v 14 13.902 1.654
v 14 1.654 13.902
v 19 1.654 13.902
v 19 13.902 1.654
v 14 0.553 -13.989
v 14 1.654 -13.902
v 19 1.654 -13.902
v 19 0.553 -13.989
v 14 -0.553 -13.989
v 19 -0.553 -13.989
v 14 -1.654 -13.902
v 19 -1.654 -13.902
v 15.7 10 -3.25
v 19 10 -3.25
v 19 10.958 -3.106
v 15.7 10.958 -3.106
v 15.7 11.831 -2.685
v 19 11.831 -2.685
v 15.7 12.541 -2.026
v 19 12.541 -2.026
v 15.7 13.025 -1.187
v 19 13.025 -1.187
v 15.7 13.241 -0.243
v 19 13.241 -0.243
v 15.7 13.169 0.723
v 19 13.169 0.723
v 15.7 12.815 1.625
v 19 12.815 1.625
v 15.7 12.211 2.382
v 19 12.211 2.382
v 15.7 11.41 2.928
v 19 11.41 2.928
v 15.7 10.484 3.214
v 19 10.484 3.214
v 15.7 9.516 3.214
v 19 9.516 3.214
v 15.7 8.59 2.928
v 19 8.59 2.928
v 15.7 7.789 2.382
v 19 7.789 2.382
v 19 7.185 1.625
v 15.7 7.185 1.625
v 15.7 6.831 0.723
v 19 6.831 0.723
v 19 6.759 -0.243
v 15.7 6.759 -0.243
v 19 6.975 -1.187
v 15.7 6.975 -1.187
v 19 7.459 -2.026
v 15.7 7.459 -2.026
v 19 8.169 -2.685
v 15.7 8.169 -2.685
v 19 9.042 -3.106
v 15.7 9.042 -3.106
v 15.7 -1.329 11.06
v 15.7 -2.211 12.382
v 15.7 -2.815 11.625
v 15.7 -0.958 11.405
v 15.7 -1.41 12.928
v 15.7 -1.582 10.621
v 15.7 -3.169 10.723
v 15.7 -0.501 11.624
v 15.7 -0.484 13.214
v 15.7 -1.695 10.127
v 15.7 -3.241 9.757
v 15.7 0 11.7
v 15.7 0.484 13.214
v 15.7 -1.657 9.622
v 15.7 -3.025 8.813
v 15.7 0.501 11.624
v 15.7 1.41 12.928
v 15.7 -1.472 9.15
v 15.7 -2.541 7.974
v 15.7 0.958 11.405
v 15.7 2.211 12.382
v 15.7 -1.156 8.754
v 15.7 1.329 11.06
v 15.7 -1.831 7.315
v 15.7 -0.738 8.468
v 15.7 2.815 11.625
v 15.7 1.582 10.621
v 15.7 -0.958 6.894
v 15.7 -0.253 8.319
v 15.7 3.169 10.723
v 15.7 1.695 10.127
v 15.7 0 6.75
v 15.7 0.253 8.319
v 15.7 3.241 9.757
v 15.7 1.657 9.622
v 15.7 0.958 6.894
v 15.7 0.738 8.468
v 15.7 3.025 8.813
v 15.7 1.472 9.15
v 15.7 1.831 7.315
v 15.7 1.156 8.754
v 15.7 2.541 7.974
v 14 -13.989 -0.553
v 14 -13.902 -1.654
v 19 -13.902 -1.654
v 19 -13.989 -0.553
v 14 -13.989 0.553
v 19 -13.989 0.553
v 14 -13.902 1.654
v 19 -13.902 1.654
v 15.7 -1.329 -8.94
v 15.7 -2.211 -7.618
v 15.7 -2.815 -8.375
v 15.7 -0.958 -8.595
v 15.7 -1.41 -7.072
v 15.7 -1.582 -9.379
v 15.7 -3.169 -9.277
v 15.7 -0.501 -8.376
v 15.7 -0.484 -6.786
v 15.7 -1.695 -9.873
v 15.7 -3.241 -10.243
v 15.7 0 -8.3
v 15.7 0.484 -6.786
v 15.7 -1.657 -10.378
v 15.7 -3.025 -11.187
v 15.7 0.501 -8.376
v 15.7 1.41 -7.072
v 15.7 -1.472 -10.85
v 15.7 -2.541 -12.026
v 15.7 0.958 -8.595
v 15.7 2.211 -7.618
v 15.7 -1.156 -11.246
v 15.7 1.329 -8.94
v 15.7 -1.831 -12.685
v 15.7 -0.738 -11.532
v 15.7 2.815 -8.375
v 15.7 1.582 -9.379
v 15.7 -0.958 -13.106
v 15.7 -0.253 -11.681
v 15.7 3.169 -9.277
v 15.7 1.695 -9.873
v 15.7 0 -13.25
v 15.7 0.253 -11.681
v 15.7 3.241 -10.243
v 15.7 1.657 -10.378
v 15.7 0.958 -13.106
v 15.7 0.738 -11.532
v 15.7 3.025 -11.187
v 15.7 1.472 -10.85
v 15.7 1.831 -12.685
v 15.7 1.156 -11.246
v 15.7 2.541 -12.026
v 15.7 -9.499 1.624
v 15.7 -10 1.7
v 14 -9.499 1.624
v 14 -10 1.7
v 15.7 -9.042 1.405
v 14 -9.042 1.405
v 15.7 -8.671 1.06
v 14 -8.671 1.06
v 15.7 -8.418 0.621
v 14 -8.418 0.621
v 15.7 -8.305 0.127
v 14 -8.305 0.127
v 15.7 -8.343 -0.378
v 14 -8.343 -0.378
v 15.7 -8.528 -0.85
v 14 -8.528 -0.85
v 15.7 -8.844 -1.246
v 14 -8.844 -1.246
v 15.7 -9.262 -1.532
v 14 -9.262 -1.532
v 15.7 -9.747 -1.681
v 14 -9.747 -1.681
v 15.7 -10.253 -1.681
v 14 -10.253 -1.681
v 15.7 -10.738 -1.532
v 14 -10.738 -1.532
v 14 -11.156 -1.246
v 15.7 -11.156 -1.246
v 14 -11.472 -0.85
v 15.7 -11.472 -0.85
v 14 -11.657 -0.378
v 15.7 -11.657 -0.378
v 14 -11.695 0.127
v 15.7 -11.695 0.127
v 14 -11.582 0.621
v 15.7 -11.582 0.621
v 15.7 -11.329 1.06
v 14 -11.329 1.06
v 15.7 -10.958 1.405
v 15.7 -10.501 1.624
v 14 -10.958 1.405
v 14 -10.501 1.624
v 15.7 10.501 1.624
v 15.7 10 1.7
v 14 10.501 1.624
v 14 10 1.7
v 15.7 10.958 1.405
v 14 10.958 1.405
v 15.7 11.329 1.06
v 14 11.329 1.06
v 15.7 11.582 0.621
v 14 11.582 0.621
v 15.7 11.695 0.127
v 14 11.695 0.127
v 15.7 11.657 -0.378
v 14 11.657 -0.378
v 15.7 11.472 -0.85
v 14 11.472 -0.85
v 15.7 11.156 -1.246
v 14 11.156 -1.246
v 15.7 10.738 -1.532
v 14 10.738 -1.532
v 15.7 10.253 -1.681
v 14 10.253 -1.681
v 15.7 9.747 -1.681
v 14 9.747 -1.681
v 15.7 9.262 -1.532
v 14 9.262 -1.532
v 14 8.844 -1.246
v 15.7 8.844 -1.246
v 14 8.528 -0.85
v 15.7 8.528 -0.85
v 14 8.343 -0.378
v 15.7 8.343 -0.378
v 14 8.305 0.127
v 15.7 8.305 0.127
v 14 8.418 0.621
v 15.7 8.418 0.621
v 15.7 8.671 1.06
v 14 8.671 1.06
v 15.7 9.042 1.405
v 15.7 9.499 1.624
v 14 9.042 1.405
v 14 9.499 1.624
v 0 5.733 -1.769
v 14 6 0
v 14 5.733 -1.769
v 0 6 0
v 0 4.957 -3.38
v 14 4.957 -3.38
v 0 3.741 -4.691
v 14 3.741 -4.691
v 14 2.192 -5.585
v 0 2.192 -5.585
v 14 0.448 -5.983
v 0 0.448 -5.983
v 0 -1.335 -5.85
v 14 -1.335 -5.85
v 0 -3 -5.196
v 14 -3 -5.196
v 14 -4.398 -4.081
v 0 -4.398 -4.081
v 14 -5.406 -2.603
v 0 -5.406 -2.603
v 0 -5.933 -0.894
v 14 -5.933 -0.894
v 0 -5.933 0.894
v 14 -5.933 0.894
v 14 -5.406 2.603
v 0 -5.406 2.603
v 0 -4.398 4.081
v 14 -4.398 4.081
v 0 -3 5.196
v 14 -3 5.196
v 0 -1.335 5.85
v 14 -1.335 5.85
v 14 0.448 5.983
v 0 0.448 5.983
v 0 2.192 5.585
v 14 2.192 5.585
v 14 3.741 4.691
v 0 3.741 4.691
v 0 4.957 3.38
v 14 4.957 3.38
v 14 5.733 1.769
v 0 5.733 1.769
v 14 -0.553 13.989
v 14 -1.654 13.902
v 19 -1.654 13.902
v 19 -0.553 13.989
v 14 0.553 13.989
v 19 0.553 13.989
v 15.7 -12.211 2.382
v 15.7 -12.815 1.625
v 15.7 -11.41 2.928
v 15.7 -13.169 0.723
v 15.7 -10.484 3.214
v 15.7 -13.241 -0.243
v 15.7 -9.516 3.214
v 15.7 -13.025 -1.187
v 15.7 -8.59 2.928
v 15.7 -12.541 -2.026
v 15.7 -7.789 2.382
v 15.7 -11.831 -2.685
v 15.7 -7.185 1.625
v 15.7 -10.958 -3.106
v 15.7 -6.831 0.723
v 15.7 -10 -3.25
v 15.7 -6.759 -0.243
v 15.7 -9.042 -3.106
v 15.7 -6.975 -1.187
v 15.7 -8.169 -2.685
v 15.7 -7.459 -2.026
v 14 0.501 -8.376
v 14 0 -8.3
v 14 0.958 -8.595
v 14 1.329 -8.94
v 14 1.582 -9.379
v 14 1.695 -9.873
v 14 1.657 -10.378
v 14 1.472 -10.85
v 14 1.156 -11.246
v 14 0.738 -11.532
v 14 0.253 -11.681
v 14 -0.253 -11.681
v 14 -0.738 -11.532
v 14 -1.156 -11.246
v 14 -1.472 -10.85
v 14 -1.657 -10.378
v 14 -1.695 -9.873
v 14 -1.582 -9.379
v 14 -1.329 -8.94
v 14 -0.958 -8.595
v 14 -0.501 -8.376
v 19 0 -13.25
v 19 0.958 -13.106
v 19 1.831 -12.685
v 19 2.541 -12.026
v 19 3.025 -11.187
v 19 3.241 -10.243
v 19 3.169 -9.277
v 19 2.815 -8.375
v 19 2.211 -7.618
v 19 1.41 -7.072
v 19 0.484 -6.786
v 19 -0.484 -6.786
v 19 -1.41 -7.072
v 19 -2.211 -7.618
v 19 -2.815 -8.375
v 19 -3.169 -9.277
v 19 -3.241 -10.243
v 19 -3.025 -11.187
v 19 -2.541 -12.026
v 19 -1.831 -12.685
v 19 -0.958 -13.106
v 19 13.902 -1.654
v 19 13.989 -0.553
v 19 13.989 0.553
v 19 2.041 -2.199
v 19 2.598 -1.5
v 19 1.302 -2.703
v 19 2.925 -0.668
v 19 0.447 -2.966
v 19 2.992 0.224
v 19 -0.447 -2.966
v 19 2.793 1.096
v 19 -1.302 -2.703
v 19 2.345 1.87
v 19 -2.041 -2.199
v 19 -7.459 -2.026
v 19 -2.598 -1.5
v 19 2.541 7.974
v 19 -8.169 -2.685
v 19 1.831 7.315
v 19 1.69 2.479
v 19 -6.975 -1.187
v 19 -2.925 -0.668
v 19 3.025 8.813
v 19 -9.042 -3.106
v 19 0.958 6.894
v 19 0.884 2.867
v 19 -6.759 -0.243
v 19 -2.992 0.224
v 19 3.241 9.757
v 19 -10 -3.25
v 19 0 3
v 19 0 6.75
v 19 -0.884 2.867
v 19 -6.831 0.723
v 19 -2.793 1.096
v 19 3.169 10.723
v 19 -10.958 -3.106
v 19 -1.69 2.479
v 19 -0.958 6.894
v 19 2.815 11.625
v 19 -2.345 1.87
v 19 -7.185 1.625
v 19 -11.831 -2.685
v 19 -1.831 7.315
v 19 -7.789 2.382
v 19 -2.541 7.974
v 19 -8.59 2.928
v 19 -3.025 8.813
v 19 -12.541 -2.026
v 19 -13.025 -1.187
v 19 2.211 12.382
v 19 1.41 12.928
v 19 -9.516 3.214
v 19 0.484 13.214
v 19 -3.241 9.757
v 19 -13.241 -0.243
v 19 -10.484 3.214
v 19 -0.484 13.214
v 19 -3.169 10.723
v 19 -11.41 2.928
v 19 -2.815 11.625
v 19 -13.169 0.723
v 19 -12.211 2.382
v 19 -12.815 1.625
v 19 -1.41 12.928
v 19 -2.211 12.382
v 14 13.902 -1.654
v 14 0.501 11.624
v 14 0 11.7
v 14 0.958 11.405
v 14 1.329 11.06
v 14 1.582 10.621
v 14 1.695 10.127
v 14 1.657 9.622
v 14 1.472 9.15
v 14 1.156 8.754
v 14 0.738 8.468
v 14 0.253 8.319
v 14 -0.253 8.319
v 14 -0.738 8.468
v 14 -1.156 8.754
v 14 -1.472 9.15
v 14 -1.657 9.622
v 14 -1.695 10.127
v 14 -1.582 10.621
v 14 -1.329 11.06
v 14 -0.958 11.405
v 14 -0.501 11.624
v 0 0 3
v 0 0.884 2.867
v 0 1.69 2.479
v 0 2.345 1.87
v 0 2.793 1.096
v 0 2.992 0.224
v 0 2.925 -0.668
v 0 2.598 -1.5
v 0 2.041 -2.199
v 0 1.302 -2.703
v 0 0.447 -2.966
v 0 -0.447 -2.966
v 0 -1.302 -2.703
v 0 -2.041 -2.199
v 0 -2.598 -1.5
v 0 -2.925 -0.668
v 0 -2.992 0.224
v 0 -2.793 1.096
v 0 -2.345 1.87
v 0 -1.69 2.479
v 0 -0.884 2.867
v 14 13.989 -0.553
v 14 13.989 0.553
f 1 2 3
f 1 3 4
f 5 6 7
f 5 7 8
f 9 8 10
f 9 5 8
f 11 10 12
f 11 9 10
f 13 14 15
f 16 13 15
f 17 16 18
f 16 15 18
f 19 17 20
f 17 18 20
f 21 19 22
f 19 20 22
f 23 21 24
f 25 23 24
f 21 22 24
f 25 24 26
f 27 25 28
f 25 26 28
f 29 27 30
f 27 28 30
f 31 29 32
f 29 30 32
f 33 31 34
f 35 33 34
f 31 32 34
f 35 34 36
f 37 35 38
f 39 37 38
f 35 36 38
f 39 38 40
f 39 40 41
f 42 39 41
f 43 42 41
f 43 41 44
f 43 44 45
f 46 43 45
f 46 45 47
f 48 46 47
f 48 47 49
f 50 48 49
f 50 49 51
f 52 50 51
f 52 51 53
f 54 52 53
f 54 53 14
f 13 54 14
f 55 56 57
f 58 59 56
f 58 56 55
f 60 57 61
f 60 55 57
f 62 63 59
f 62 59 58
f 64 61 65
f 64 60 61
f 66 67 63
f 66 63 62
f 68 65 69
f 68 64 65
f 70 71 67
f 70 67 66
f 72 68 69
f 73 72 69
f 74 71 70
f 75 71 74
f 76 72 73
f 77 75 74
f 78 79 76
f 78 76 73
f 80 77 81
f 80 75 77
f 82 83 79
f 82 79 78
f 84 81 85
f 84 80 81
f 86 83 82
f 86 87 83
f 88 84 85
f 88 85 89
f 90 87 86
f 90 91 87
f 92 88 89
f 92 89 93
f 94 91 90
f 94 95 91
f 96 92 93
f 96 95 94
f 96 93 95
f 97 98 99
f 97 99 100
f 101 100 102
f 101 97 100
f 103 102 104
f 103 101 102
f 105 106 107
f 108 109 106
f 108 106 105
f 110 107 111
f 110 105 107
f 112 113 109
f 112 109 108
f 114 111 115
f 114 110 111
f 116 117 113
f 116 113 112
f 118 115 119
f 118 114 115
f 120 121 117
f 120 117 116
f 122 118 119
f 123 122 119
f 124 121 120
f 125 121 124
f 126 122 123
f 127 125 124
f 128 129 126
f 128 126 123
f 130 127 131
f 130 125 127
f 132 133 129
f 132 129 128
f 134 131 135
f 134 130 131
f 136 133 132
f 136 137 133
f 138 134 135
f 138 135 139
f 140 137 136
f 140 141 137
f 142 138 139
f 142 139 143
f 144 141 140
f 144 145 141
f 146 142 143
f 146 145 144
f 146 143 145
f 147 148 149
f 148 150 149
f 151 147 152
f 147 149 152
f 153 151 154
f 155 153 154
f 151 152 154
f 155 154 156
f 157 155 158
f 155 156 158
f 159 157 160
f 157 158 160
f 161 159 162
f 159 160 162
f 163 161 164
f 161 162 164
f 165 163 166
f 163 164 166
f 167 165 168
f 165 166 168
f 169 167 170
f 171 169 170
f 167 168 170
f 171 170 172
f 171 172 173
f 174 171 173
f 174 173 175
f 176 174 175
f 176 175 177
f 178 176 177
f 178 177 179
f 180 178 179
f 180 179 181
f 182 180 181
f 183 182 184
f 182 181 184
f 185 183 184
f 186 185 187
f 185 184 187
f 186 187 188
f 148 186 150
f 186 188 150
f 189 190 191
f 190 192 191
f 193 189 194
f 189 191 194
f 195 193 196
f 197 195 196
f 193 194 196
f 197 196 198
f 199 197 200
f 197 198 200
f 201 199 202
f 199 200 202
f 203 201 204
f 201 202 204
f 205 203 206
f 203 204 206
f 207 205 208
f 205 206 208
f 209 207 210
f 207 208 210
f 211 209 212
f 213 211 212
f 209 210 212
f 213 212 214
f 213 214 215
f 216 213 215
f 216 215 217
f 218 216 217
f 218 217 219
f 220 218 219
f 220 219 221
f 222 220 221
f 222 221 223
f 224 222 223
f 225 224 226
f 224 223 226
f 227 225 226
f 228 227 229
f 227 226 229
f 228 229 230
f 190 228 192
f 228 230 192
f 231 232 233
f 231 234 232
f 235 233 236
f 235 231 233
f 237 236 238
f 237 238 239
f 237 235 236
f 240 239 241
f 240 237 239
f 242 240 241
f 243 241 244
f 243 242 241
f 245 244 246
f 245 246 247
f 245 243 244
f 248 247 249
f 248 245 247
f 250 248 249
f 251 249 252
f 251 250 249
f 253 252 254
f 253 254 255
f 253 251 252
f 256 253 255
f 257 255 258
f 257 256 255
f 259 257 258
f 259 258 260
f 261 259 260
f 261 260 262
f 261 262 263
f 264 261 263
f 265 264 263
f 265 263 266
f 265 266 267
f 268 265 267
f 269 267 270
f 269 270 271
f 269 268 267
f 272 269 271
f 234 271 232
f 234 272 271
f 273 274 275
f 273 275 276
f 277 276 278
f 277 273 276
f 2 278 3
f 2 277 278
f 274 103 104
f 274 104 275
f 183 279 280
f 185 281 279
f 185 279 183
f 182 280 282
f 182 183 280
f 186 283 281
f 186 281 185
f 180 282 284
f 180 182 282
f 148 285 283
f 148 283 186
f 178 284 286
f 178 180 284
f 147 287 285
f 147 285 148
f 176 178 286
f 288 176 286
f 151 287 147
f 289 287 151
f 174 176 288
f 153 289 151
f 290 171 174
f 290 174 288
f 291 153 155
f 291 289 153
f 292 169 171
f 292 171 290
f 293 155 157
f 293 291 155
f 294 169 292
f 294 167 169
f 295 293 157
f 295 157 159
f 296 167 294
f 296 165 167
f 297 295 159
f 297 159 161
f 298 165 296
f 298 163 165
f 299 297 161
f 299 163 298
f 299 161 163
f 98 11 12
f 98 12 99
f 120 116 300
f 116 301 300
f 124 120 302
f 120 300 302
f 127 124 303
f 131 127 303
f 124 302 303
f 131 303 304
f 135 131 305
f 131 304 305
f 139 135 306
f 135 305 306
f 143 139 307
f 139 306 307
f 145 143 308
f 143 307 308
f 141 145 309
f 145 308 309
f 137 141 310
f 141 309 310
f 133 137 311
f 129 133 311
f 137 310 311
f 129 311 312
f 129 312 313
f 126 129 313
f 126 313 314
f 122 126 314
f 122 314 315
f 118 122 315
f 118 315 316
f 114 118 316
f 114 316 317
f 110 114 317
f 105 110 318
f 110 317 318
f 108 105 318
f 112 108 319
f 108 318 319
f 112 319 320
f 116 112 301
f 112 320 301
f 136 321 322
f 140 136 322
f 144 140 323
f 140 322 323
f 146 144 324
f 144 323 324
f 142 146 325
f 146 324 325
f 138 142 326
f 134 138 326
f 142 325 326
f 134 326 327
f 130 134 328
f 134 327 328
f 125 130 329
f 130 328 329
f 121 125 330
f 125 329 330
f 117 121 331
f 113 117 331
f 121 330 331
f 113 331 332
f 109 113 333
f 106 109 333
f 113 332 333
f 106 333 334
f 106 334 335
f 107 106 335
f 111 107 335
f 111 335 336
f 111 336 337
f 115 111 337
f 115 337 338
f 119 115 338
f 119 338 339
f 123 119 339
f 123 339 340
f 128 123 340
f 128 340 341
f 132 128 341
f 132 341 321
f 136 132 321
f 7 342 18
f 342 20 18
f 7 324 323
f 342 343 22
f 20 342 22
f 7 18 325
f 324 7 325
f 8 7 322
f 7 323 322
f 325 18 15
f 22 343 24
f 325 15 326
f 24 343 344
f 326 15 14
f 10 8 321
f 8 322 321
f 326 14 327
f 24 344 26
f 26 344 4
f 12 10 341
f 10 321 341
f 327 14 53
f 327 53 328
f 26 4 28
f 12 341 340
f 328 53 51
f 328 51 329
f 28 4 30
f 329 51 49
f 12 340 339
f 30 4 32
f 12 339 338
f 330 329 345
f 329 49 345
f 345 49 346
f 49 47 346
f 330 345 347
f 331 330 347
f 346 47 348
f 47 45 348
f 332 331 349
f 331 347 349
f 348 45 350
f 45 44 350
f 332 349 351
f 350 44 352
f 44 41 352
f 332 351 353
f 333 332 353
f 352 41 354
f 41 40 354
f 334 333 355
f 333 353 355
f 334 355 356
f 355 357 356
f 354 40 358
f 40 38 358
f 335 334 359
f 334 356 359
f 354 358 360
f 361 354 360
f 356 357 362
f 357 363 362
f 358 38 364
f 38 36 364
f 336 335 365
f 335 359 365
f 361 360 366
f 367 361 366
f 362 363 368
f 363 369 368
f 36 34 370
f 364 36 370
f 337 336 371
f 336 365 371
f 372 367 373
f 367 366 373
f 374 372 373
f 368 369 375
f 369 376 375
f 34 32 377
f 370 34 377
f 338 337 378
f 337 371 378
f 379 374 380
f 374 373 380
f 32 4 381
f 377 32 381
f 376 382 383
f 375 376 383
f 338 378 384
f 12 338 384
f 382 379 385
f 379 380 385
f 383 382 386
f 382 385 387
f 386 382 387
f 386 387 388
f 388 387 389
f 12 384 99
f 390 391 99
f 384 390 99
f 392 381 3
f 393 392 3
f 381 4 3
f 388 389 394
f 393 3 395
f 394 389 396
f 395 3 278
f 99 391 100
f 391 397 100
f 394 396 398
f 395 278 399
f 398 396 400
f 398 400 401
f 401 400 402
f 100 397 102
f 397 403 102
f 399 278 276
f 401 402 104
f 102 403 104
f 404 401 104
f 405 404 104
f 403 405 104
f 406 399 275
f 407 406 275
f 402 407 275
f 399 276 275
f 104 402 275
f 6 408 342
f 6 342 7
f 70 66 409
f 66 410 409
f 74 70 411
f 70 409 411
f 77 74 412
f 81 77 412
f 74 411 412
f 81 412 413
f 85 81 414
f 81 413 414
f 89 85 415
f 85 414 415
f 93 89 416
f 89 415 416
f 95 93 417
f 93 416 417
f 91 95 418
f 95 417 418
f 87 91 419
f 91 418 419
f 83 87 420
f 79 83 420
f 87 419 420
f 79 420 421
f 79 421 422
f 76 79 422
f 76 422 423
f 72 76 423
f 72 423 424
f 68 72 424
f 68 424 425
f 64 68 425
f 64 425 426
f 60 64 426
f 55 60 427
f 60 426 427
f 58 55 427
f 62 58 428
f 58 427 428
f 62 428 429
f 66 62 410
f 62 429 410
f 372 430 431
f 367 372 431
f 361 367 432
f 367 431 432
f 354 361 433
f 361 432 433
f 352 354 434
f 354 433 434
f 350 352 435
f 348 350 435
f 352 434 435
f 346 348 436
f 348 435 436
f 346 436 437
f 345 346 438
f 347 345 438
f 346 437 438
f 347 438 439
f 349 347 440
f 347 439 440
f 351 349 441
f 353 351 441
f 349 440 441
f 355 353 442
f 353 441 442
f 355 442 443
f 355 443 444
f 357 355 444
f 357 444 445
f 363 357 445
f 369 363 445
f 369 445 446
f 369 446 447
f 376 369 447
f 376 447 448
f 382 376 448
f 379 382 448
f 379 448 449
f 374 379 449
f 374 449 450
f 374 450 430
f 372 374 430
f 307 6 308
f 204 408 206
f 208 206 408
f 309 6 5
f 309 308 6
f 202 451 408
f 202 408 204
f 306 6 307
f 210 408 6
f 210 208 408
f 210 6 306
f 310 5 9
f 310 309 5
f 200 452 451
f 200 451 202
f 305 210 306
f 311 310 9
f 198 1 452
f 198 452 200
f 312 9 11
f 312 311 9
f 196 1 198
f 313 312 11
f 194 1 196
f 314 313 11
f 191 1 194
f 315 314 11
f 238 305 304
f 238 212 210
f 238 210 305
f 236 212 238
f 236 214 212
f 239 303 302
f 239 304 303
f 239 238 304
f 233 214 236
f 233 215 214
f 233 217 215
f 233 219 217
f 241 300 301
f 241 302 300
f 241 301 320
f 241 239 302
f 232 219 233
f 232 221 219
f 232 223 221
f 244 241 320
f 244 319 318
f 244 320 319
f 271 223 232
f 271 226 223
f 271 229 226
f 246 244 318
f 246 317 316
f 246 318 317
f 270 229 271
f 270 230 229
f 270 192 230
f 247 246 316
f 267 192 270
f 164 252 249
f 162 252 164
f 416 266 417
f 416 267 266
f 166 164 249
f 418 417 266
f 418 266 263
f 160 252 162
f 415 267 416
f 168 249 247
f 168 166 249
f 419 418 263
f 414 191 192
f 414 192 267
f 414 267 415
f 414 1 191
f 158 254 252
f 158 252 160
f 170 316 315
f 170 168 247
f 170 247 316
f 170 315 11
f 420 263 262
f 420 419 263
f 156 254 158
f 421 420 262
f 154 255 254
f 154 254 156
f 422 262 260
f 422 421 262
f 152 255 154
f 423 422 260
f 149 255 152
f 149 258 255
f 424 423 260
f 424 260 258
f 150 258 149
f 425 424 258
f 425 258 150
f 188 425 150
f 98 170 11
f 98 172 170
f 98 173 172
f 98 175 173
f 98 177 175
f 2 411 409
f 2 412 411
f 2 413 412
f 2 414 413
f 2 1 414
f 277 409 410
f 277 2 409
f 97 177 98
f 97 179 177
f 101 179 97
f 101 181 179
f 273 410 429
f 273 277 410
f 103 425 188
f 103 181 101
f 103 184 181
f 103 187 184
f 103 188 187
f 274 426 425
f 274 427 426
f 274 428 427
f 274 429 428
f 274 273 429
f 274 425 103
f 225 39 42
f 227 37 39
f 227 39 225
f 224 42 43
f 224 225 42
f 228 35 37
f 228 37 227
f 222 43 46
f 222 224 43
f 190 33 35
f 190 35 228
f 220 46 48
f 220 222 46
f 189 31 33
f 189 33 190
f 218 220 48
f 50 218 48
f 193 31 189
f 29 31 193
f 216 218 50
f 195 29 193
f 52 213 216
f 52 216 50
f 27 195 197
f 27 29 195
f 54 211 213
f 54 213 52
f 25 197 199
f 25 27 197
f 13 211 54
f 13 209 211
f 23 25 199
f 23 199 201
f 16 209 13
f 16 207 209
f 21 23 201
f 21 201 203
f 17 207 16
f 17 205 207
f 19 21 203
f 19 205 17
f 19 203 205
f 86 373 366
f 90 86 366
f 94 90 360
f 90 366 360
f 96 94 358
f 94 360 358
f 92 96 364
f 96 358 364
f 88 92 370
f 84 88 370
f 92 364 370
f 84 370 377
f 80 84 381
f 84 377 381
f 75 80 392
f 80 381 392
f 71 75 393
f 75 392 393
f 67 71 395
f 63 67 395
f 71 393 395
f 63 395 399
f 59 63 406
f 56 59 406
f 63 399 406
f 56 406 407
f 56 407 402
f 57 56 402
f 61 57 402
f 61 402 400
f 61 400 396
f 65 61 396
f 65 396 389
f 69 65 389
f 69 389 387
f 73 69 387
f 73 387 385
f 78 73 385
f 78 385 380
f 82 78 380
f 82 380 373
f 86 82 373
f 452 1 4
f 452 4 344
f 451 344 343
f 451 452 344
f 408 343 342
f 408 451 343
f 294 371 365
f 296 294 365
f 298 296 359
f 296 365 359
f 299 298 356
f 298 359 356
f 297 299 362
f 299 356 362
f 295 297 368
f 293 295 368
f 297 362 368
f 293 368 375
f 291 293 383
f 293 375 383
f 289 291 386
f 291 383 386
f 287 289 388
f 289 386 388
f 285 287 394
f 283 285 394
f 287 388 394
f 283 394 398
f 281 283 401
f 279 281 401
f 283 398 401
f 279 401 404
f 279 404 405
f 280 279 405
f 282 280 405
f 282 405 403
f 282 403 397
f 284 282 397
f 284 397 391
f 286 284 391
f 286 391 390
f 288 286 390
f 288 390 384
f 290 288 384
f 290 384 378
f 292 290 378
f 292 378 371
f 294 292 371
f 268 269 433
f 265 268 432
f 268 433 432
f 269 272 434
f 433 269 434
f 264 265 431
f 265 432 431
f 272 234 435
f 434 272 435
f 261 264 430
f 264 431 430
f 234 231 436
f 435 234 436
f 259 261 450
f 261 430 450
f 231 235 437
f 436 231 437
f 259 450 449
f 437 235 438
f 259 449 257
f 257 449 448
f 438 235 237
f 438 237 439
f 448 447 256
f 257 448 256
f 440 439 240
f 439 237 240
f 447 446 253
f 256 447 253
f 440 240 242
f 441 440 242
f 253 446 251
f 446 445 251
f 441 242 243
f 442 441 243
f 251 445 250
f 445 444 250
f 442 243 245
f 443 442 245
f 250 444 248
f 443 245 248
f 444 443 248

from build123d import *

# Parameters (mm, degrees)
BOSS_EXTRUDE1_DEPTH                              = 5
SKETCH2_W                                        = 14
SKETCH2_H                                        = 6
F_6_0_6_DIAMETER_HOLE1_D                         = 6
F_6_0_6_DIAMETER_HOLE1_DEPTH                     = 19
CBORE_FOR_M3_HEX_HEAD_MACHINE_SCREW1_D           = 3.4
CBORE_FOR_M3_HEX_HEAD_MACHINE_SCREW1_DEPTH       = 19
CBORE_FOR_M3_HEX_HEAD_MACHINE_SCREW1_CBORE_D     = 6.5
CBORE_FOR_M3_HEX_HEAD_MACHINE_SCREW1_CBORE_DEPTH = 3.3


with BuildPart() as part:
    # Sketch1 → Boss-Extrude1 (new body)
    with BuildSketch(Plane(origin=(14, 0, 0), x_dir=(0, -1, 0), z_dir=(-1, 0, 0))):
        with BuildLine():
            Line((-1.654450236, 13.90189895), (-13.90189895, 1.654450236))
            ThreePointArc((-13.90189895, 1.654450236), (-14, 0), (-13.90189895, -1.654450236))
            Line((-13.90189895, -1.654450236), (-1.654450236, -13.90189895))
            ThreePointArc((-1.654450236, -13.90189895), (0, -14), (1.654450236, -13.90189895))
            Line((1.654450236, -13.90189895), (13.90189895, -1.654450236))
            ThreePointArc((13.90189895, -1.654450236), (14, 0), (13.90189895, 1.654450236))
            Line((13.90189895, 1.654450236), (1.654450236, 13.90189895))
            ThreePointArc((1.654450236, 13.90189895), (0, 14), (-1.654450236, 13.90189895))
        make_face()
    extrude(amount=-BOSS_EXTRUDE1_DEPTH)

    # Sketch2 → Revolve1 (revolve)
    with BuildSketch(Plane(origin=(0, 0, 0), x_dir=(-1, 0, 0), z_dir=(0, 0, -1))):
        with Locations((-7, 3)):
            Rectangle(SKETCH2_W, SKETCH2_H)
    revolve(axis=Axis((14, 0, 0), (-1, 0, 0)))

    # Ø6.0 (6) Diameter Hole1
    with Locations(Plane(origin=(19, 0, 0), x_dir=(0, 0, -1), z_dir=(1, 0, 0))):
        with Locations((0, 0)):
            Hole(F_6_0_6_DIAMETER_HOLE1_D / 2, depth=F_6_0_6_DIAMETER_HOLE1_DEPTH)

    # CBORE for M3 Hex Head Machine Screw1
    with Locations(Plane(origin=(19, 0, 0), x_dir=(0, 0, -1), z_dir=(1, 0, 0))):
        with Locations((0, -10), (10, 0), (-10, 0), (0, 10)):
            CounterBoreHole(CBORE_FOR_M3_HEX_HEAD_MACHINE_SCREW1_D / 2, CBORE_FOR_M3_HEX_HEAD_MACHINE_SCREW1_CBORE_D / 2, CBORE_FOR_M3_HEX_HEAD_MACHINE_SCREW1_CBORE_DEPTH, depth=CBORE_FOR_M3_HEX_HEAD_MACHINE_SCREW1_DEPTH)


solid = part.part
